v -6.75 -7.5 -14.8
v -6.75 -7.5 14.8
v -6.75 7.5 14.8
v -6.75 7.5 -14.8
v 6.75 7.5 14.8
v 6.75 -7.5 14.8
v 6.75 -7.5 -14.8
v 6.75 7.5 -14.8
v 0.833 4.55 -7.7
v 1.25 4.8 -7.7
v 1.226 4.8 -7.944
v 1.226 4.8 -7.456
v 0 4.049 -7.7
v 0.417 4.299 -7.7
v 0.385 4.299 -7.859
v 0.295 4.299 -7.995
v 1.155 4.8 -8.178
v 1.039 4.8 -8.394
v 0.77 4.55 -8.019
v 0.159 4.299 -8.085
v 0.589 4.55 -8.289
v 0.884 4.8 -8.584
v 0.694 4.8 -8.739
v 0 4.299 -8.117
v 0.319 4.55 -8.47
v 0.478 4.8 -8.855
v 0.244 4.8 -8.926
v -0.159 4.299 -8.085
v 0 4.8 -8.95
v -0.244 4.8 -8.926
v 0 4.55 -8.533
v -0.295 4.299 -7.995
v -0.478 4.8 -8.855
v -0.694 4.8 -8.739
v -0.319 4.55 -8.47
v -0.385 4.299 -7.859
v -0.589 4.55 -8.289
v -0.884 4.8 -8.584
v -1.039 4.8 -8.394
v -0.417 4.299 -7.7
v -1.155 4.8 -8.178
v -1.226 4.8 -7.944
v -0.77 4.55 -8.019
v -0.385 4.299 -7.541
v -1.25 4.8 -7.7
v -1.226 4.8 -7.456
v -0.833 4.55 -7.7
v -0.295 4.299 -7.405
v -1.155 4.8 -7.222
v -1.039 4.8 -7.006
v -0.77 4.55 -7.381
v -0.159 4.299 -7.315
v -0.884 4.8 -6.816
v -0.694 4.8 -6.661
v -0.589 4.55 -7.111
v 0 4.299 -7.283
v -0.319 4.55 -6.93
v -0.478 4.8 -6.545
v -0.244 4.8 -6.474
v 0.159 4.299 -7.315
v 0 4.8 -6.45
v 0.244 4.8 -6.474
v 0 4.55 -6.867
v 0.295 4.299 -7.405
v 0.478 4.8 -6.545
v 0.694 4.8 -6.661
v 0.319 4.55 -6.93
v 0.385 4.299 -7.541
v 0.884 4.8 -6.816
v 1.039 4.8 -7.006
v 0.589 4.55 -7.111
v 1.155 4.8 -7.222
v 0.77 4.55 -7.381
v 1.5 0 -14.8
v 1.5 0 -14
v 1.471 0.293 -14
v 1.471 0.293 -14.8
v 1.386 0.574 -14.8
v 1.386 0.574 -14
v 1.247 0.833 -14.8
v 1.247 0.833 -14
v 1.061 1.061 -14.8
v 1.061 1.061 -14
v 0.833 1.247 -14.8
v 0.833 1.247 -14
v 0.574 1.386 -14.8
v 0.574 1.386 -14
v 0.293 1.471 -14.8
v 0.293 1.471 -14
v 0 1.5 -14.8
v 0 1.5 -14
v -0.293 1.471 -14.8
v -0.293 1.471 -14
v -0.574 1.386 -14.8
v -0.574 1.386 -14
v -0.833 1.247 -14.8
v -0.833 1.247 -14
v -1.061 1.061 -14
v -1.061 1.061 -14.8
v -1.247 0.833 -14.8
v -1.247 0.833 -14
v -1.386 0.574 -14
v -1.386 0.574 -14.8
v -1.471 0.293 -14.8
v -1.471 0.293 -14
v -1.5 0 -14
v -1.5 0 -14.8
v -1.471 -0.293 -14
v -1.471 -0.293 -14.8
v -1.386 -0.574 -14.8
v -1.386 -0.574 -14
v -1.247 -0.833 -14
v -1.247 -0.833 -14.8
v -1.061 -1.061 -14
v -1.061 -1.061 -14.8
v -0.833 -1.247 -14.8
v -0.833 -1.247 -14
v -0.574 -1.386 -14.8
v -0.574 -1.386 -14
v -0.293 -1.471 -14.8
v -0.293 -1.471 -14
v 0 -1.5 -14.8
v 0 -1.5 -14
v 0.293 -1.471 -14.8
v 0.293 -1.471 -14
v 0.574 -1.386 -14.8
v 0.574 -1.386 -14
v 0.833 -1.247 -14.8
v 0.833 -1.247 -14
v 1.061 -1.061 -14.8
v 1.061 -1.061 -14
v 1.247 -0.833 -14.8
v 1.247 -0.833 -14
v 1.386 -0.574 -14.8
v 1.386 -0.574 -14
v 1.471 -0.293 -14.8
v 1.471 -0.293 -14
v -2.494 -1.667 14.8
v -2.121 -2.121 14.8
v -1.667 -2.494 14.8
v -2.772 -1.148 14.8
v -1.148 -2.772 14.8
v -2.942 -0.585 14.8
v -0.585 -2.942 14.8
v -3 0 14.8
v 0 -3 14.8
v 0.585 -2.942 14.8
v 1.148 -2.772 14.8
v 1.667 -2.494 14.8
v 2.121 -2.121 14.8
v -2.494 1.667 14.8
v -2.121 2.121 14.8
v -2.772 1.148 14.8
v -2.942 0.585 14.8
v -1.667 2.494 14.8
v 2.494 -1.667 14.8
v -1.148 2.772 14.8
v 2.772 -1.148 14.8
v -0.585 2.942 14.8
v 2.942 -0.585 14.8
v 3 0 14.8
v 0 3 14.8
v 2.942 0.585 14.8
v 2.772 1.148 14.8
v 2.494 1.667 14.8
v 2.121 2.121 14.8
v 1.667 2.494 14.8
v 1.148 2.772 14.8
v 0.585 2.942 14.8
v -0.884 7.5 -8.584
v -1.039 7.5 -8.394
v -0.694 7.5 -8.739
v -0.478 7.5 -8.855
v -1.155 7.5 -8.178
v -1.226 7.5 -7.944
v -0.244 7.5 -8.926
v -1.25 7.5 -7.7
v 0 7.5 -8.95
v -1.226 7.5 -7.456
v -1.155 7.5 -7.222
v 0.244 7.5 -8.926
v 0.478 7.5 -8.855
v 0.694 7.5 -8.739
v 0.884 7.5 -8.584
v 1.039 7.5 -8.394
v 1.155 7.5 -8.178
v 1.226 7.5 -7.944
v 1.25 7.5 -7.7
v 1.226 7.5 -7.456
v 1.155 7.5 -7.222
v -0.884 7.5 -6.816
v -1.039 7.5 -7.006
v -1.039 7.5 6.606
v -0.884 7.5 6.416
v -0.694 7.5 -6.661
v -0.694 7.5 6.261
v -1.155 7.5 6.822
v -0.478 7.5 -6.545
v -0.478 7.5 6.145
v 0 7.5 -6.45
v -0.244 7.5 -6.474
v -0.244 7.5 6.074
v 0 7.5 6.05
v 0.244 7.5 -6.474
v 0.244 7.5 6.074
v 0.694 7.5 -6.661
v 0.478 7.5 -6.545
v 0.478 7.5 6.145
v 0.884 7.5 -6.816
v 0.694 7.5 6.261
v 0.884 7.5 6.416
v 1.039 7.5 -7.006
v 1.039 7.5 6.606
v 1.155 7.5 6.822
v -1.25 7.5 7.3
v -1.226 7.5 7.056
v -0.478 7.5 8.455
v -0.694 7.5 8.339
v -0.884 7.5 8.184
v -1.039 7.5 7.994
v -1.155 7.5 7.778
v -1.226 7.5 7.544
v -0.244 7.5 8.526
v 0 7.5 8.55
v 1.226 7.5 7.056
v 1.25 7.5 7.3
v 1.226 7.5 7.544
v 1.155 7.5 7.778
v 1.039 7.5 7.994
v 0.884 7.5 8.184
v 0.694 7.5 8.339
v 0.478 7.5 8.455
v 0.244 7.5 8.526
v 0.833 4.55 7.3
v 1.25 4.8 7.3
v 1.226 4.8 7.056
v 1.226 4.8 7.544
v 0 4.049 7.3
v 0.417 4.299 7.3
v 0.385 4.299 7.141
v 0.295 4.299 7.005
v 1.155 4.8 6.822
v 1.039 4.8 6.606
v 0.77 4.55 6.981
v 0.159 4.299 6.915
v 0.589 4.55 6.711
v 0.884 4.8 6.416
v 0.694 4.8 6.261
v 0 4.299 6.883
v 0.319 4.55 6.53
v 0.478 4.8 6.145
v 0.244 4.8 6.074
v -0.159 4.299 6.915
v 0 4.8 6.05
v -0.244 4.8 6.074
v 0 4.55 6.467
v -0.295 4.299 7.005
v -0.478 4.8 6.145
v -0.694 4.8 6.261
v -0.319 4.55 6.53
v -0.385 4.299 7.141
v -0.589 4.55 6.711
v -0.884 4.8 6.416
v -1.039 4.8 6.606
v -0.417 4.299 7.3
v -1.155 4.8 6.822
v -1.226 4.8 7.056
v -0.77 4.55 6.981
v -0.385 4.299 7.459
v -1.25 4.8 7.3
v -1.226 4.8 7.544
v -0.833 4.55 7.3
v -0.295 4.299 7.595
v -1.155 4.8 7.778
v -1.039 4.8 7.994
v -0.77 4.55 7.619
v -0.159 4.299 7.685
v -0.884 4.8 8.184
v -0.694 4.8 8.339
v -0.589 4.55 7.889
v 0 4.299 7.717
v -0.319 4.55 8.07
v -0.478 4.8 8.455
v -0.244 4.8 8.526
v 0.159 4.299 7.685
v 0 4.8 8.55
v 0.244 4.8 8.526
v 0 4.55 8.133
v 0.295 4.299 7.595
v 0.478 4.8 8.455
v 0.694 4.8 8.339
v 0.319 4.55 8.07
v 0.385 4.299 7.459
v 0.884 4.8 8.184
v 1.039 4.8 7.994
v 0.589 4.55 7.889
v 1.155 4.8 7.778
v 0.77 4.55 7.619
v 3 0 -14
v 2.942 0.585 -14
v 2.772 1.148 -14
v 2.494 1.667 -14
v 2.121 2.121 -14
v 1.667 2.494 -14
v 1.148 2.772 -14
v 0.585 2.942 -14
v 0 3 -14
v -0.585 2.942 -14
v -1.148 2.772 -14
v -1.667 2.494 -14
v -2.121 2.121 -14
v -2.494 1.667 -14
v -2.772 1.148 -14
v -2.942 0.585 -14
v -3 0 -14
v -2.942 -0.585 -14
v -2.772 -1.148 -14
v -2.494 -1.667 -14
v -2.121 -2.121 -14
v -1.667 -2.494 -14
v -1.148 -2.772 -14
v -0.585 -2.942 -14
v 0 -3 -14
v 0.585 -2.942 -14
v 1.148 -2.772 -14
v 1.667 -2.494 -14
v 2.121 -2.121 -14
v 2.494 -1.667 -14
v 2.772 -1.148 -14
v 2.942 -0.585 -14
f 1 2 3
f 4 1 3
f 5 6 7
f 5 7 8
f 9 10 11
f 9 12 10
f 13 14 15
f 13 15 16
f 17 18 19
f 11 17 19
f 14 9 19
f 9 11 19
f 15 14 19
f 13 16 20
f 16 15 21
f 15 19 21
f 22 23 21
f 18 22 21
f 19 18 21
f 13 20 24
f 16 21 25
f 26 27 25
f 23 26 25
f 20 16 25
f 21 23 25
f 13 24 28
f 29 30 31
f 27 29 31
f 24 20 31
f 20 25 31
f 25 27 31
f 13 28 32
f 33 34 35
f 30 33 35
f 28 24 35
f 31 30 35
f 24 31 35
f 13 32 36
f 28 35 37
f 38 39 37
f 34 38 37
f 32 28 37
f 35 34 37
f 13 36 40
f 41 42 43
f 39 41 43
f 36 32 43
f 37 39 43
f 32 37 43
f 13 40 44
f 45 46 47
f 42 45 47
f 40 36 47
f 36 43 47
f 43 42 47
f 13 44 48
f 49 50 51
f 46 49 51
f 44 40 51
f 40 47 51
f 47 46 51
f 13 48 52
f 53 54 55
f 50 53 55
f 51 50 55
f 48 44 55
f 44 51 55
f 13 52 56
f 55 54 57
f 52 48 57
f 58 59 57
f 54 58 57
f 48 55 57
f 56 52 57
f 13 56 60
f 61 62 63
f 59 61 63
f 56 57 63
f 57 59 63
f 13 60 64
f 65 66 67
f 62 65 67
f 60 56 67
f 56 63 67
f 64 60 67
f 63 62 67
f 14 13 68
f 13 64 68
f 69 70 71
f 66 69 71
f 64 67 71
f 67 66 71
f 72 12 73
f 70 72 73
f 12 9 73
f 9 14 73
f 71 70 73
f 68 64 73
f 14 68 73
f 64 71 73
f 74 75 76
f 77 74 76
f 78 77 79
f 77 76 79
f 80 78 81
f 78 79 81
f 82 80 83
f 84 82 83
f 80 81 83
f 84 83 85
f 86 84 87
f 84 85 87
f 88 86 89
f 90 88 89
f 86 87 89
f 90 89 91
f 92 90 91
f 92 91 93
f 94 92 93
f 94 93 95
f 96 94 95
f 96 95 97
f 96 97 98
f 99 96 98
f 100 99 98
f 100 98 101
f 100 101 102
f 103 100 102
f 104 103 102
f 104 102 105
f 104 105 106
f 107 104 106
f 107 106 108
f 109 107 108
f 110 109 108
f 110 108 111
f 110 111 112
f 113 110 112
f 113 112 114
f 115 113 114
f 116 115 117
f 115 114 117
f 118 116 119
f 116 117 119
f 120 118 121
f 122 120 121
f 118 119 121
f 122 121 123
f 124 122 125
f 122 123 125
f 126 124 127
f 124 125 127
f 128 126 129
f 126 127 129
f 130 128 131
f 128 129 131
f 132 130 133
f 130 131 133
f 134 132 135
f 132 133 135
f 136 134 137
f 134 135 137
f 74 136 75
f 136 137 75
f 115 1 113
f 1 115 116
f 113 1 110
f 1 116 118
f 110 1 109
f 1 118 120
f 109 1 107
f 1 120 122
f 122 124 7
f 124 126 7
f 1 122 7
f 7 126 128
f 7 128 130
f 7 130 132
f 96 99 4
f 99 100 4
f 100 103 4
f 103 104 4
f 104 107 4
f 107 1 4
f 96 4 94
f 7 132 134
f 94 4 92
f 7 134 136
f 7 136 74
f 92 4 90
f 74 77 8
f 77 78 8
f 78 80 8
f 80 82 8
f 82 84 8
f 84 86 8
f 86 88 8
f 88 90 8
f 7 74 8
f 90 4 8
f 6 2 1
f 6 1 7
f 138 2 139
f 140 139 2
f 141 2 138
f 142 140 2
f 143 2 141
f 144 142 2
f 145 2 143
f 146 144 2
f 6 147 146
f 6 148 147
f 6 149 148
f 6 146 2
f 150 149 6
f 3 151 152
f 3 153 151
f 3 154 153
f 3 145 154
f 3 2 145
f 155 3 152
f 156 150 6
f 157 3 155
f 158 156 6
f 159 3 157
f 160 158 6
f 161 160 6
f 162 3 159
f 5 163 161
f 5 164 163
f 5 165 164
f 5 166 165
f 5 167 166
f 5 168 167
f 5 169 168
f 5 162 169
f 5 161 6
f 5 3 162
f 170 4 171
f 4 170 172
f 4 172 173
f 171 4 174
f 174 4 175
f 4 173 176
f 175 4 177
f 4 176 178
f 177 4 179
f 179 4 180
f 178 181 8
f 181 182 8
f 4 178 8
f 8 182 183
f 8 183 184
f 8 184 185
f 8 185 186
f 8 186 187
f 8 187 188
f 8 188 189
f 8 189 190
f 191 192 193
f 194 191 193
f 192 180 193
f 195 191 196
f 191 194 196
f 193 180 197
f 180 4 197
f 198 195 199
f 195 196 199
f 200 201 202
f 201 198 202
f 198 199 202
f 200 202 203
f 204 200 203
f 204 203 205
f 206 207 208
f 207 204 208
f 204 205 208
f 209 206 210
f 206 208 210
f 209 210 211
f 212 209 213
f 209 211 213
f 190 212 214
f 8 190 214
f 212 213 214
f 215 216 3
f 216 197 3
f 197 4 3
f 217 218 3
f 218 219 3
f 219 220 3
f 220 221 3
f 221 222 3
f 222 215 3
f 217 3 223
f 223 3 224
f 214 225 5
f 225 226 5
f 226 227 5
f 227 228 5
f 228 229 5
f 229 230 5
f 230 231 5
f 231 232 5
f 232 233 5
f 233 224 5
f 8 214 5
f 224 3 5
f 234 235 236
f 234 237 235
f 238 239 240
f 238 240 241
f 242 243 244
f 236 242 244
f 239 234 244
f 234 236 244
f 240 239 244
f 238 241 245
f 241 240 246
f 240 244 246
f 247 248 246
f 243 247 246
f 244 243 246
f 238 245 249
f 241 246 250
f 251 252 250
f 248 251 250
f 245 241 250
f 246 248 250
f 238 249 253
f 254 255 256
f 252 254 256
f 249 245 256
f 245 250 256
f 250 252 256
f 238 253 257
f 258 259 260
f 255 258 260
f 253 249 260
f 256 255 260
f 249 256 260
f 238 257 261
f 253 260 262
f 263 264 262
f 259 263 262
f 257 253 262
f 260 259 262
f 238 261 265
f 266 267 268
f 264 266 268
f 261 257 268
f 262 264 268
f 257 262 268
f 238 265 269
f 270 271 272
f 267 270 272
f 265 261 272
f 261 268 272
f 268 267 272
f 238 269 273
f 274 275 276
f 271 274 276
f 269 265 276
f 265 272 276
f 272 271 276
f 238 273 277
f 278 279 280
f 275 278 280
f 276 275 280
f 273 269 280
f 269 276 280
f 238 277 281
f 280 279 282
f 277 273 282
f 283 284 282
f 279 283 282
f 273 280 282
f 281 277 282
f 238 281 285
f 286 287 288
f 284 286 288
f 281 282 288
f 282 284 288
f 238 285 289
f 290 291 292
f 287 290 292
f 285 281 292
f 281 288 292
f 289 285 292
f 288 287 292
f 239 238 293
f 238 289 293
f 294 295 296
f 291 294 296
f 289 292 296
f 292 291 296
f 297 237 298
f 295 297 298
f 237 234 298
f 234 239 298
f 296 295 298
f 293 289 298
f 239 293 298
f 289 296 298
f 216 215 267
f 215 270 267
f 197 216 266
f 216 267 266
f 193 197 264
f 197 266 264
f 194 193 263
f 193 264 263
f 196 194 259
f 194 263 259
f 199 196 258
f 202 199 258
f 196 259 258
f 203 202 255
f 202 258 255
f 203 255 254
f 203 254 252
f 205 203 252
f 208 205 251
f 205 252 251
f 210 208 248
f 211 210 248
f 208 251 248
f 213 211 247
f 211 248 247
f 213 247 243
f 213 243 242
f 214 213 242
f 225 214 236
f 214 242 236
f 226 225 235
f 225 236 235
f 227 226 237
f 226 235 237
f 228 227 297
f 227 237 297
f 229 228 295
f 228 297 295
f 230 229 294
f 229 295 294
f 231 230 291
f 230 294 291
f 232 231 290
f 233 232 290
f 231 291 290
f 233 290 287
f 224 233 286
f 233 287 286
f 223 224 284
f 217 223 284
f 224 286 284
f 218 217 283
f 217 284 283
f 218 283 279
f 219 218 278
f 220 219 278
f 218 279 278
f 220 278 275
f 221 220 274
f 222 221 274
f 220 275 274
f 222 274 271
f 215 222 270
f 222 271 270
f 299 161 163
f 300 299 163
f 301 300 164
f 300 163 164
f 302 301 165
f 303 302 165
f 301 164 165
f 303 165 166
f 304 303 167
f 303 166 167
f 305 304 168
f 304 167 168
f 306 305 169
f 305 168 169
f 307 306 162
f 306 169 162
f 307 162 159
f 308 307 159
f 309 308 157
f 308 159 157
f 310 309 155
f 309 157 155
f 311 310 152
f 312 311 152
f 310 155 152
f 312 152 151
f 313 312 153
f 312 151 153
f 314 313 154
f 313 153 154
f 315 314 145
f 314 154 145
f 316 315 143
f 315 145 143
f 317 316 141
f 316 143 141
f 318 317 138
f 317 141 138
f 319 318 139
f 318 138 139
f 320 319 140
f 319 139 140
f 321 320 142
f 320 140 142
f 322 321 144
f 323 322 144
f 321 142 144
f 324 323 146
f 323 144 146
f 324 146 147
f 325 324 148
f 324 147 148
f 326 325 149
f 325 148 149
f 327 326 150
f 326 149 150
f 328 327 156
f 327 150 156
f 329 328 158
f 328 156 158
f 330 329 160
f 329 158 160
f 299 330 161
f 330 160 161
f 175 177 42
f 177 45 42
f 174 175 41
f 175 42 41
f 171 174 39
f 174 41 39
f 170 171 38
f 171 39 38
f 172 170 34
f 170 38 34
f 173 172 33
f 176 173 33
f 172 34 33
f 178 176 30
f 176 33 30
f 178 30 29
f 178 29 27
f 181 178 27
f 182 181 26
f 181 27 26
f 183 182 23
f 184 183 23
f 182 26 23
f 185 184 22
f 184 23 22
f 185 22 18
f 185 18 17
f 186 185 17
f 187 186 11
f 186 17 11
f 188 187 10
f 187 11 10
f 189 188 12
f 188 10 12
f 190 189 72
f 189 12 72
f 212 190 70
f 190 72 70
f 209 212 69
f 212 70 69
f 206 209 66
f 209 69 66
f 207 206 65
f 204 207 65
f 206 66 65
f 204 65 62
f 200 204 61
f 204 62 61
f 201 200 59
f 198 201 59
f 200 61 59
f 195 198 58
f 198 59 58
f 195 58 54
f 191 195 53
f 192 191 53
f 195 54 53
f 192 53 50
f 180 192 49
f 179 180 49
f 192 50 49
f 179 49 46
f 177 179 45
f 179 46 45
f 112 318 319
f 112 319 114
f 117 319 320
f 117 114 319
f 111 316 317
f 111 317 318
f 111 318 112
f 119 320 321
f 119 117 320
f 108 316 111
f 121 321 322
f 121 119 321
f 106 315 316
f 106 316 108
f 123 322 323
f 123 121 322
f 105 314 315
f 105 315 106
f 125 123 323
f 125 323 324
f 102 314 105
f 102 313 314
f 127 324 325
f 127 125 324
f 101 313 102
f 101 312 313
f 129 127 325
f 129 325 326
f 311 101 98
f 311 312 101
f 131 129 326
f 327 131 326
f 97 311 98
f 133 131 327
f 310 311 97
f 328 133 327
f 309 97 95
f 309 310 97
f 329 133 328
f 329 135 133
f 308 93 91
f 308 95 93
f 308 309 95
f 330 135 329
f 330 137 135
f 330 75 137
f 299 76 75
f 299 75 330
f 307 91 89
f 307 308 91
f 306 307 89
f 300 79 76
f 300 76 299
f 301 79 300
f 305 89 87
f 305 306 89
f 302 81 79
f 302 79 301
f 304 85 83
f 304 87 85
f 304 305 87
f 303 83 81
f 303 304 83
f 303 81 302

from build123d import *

# Parameters (mm, degrees)
SKETCH1_W                 = 13.5
SKETCH1_H                 = 15
BOSS_EXTRUDE1_DEPTH       = 14.8
SKETCH2_R                 = 3
CUT_EXTRUDE1_DEPTH        = 28.8
SKETCH3_R                 = 1.5
CUT_EXTRUDE2_DEPTH        = 30.6
M3X0_5_TAPPED_HOLE1_D     = 2.5
M3X0_5_TAPPED_HOLE1_DEPTH = 2.7
M3X0_5_TAPPED_HOLE1_TIP   = 0.751075774


with BuildPart() as part:
    # Sketch1 → Boss-Extrude1 (new body, symmetric)
    with BuildSketch(Plane.XY):
        Rectangle(SKETCH1_W, SKETCH1_H)
    extrude(amount=BOSS_EXTRUDE1_DEPTH, both=True)

    # Sketch2 → Cut-Extrude1 (cut)
    with BuildSketch(Plane.XY.offset(14.8)):
        Circle(SKETCH2_R)
    extrude(amount=-CUT_EXTRUDE1_DEPTH, mode=Mode.SUBTRACT)

    # Sketch3 → Cut-Extrude2 (cut, through all)
    with BuildSketch(Plane.XY.offset(14.8)):
        Circle(SKETCH3_R)
    extrude(amount=-CUT_EXTRUDE2_DEPTH, mode=Mode.SUBTRACT)

    # M3x0.5 Tapped Hole1
    with Locations(Plane(origin=(0, 7.5, 0), x_dir=(1, 0, 0), z_dir=(0, 1, 0))):
        with Locations((0, 7.7), (0, -7.3)):
            Hole(M3X0_5_TAPPED_HOLE1_D / 2, depth=M3X0_5_TAPPED_HOLE1_DEPTH)
            with Locations((0, 0, -(M3X0_5_TAPPED_HOLE1_DEPTH + M3X0_5_TAPPED_HOLE1_TIP / 2))):  # 118° drill point
                Cone(0, M3X0_5_TAPPED_HOLE1_D / 2, M3X0_5_TAPPED_HOLE1_TIP, mode=Mode.SUBTRACT)


solid = part.part
